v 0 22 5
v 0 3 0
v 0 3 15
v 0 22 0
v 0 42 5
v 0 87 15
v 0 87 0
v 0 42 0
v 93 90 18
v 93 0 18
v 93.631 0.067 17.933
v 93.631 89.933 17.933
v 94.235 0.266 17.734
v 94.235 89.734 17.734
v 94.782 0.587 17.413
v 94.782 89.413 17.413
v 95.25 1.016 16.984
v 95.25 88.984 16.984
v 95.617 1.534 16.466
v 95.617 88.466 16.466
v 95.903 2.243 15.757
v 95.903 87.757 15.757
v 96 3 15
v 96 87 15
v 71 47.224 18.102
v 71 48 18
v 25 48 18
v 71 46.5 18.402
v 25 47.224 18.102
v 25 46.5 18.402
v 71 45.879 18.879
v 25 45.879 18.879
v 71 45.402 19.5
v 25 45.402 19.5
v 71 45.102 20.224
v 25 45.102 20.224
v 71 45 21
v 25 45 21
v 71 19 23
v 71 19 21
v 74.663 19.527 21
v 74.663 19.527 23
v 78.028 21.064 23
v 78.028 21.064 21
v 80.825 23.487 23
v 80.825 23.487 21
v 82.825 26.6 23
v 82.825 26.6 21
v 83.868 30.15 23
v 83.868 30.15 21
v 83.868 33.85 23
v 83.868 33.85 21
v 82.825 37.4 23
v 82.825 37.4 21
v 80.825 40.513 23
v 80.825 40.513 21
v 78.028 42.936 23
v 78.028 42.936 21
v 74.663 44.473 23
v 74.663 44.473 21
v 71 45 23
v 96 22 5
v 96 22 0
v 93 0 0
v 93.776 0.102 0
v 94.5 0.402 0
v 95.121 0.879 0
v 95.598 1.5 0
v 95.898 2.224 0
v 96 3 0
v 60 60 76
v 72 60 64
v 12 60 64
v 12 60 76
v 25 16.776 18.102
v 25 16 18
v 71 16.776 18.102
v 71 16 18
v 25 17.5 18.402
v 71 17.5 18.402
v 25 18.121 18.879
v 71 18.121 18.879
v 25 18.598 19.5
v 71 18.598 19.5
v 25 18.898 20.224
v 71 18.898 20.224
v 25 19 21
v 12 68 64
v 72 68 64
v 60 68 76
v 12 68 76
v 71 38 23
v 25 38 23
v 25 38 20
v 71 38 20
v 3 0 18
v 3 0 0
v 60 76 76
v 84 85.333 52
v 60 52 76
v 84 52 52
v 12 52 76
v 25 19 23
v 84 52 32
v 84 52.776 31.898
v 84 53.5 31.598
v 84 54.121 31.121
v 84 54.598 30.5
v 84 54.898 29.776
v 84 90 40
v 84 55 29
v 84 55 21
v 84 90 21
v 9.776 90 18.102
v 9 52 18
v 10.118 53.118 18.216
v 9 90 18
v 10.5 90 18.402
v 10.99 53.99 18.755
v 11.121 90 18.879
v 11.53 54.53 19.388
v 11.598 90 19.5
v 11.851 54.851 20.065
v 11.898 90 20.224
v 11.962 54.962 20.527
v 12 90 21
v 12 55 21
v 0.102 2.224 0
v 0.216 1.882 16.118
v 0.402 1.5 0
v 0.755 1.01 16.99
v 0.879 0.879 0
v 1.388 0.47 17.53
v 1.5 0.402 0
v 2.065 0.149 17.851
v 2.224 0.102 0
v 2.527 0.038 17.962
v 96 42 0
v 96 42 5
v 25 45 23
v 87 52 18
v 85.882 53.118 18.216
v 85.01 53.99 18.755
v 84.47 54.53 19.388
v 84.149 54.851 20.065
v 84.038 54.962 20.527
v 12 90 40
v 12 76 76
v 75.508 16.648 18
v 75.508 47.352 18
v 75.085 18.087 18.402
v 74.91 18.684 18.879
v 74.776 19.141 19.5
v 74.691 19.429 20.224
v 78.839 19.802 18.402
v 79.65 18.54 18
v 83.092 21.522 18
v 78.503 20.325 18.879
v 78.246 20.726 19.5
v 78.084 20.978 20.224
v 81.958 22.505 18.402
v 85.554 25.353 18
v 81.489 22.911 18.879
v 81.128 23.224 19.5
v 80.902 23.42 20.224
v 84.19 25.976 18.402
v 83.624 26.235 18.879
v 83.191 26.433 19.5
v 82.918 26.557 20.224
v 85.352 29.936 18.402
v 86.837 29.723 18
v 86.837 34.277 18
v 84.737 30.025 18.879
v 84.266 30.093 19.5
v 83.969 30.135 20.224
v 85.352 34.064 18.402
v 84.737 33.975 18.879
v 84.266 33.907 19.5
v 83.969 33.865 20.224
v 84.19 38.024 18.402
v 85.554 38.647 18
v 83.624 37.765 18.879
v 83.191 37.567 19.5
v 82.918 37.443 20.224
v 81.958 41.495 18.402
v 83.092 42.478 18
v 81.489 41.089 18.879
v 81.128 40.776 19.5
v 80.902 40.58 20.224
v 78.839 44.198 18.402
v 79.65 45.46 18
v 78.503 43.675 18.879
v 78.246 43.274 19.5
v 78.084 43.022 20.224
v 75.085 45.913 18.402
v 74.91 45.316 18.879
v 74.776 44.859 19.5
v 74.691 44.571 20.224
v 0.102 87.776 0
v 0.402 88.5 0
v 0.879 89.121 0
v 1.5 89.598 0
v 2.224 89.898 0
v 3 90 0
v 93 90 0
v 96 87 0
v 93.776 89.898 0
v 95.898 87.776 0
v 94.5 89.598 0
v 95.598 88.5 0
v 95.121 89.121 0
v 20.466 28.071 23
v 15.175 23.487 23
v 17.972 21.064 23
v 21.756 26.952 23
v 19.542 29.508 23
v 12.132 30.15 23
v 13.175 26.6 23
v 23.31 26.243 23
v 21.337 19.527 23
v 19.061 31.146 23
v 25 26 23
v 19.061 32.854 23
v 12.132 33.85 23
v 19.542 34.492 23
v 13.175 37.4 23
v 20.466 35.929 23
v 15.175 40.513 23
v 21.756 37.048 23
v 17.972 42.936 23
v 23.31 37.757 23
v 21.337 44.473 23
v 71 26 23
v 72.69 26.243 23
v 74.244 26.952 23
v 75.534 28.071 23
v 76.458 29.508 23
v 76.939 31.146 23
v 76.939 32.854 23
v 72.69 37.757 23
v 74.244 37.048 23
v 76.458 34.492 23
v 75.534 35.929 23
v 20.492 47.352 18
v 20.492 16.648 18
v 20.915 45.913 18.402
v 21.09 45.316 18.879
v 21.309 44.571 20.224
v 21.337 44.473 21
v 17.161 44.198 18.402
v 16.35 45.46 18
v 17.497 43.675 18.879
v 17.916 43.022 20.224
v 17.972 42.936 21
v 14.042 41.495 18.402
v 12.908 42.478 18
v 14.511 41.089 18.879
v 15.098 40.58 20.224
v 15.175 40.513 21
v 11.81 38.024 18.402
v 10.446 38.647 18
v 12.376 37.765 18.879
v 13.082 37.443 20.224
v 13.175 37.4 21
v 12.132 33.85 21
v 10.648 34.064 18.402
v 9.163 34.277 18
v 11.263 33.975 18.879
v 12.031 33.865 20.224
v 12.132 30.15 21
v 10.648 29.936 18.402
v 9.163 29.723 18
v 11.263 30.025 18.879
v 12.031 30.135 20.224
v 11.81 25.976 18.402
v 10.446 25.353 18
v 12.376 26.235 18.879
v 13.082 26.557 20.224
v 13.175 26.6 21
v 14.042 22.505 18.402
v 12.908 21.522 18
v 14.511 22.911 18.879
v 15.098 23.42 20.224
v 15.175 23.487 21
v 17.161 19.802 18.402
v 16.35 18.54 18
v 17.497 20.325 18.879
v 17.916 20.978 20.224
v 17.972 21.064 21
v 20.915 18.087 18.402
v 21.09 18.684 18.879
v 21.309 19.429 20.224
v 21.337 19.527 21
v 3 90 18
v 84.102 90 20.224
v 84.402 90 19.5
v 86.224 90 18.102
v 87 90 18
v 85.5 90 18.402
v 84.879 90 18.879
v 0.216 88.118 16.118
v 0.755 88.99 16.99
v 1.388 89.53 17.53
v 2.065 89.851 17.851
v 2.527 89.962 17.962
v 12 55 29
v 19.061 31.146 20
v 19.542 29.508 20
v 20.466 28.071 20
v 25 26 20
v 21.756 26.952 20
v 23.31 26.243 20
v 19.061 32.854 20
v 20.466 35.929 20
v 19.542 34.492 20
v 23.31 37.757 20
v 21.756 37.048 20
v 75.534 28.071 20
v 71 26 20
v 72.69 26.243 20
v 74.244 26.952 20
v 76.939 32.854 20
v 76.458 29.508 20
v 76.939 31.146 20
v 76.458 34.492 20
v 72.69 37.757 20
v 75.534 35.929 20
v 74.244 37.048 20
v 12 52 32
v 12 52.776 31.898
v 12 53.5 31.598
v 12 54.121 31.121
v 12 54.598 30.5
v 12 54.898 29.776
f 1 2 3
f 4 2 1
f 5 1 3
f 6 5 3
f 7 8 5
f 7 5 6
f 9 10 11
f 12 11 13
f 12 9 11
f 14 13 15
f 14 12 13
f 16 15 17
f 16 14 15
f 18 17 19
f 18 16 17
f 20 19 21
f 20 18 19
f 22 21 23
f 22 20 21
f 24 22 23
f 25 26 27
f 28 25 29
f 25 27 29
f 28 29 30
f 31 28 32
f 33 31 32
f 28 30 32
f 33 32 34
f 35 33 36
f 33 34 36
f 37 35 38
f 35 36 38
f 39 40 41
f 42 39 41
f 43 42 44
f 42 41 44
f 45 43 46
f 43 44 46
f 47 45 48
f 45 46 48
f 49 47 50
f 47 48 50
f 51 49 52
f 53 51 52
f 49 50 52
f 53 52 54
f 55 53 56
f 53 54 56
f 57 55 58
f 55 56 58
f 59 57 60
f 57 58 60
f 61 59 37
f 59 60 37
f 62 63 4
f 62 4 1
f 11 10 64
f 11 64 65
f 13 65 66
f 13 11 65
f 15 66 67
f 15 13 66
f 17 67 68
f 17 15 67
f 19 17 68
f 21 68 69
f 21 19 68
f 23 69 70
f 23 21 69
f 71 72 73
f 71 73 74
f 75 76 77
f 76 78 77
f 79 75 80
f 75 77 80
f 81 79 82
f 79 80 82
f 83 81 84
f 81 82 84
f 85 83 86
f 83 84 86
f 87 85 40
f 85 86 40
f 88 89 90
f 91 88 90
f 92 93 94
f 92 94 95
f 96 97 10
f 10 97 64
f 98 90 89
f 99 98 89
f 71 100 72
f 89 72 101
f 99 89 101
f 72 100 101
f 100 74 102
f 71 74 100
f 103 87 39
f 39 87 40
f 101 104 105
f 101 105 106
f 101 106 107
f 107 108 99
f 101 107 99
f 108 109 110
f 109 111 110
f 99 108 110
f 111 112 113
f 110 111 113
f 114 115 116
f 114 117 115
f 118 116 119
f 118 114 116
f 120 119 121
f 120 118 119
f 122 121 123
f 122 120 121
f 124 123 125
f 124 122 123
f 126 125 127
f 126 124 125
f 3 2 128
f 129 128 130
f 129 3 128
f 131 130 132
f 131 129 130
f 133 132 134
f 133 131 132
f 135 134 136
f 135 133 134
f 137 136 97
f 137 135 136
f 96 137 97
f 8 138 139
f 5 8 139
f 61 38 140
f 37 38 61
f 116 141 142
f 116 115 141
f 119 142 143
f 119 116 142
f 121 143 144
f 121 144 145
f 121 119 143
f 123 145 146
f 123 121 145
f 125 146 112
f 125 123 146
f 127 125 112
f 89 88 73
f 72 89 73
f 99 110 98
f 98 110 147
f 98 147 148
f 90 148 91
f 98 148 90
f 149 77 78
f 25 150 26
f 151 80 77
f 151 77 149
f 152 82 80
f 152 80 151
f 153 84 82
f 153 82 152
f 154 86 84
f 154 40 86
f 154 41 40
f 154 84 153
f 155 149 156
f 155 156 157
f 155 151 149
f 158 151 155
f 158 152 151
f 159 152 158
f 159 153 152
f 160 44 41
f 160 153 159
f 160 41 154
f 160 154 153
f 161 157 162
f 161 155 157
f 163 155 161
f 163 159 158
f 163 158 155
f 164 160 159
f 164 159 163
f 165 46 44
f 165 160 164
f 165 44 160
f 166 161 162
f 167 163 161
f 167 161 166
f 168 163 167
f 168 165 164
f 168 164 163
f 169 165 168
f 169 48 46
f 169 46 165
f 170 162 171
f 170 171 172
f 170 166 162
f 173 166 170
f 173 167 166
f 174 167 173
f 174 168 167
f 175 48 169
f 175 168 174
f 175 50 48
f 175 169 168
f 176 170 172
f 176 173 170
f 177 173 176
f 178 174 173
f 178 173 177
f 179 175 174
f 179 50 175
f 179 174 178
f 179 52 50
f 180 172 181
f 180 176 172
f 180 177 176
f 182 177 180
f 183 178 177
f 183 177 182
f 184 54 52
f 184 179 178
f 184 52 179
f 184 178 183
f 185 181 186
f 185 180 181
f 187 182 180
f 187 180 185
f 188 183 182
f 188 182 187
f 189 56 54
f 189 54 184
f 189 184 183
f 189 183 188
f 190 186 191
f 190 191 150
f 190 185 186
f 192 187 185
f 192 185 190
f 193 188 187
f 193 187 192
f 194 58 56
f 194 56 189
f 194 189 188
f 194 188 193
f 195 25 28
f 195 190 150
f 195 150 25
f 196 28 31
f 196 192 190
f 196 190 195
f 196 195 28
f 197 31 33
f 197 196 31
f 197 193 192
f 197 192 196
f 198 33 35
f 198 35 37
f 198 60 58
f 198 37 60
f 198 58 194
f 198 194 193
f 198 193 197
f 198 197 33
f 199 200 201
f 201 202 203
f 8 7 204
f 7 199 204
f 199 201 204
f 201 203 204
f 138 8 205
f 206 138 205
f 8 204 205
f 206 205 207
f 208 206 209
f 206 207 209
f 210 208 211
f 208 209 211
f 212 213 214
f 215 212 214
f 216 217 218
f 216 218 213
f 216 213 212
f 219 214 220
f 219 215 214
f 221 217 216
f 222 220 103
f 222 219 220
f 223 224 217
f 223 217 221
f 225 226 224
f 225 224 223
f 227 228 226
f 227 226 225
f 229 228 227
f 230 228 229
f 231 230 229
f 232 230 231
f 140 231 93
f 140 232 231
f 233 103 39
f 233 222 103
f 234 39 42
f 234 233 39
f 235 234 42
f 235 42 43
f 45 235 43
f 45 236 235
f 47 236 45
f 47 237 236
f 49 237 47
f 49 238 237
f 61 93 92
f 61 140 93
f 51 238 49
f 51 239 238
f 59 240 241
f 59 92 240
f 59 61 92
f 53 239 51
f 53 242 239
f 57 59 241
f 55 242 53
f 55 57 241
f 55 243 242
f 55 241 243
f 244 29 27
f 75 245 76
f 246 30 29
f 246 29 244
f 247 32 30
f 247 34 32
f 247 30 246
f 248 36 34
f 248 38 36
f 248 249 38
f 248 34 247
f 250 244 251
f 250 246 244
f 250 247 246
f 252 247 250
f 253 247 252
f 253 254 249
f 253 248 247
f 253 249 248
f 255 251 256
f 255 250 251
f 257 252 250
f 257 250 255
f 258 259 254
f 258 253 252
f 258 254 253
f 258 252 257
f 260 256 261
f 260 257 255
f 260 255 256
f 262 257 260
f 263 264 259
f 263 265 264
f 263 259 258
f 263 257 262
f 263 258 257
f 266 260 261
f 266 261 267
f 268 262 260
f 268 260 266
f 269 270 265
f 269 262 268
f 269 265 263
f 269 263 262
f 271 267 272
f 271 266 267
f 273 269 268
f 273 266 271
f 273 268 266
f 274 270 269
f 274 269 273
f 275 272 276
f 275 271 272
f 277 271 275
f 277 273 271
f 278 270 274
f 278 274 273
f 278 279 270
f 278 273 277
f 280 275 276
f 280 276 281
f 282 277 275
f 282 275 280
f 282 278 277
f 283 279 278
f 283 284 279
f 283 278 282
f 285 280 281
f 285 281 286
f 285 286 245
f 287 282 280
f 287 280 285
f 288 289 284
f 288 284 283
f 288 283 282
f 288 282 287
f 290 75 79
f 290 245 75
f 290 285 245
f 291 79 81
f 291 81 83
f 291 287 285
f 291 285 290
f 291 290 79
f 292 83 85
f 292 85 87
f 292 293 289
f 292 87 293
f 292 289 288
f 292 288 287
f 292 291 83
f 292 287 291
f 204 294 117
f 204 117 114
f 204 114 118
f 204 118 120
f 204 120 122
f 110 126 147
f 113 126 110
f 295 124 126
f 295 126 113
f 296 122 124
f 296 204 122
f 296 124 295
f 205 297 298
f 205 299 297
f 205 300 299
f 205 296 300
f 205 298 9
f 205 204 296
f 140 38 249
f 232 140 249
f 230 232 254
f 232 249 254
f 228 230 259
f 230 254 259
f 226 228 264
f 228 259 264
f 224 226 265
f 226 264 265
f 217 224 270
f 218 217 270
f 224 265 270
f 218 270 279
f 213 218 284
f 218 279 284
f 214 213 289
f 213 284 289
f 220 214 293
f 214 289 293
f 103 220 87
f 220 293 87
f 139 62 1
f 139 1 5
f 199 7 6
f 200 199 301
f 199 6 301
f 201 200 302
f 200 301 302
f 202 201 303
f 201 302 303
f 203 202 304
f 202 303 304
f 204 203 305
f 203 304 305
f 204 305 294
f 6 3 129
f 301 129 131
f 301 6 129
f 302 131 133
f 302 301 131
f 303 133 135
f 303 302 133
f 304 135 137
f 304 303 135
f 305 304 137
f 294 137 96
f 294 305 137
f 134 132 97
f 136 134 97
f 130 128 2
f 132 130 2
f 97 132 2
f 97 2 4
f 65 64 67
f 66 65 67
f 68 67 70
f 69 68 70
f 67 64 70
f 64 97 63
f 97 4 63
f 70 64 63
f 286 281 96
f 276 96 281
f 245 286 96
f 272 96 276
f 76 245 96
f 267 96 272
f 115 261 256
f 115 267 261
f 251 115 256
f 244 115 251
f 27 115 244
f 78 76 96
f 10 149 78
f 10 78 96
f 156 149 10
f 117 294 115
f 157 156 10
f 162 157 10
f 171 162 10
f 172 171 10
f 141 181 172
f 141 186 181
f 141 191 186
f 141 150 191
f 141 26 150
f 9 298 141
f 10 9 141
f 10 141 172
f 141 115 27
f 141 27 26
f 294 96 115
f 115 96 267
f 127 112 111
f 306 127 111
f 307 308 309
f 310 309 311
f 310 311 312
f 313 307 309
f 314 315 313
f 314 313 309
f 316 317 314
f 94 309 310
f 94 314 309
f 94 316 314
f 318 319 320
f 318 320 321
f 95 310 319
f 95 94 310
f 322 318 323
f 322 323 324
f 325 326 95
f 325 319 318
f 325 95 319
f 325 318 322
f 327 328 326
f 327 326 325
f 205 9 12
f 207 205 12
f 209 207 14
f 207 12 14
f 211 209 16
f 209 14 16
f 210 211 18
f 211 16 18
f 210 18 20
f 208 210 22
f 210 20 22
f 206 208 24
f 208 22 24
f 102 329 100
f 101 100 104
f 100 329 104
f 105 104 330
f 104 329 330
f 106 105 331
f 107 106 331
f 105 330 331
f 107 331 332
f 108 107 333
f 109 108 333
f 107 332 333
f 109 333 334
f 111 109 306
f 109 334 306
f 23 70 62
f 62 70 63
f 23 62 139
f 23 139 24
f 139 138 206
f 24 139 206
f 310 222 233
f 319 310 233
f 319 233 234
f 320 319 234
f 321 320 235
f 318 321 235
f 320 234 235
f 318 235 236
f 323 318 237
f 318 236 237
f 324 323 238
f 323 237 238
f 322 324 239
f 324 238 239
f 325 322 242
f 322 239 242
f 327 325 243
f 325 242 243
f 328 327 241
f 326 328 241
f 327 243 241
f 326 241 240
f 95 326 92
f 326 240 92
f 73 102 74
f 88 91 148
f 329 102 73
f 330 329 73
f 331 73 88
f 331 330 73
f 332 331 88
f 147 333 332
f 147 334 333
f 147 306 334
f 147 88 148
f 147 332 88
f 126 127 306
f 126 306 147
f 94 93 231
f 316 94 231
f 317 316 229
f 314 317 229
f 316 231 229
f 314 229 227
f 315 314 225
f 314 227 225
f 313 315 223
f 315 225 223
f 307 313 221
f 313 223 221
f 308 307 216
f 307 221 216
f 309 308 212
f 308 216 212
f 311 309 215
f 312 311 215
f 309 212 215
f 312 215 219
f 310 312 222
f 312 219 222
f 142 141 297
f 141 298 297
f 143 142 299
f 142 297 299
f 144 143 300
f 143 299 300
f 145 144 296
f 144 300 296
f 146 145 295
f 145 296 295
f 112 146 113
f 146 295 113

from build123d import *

# Parameters (mm, degrees)
F0_W      = 96
F0_H      = 90
F1_DEPTH  = 18
F2_W      = 72
F2_H      = 38
F4_DEPTH  = 58
F6_DEPTH  = 38
F7_W      = 8
F7_H      = 12
F8_DEPTH  = 60.001
F10_DEPTH = 72.001
F11_W     = 20
F11_H     = 5
F12_DEPTH = 96
F13_W     = 46
F13_H     = 26
F14_DEPTH = 5
F15_W     = 46
F15_H     = 12
F17_DEPTH = 3
F18_W     = 3
F18_H     = 14
F19_DEPTH = 72
F20_R     = 2.99999


# Not quite as in the source:
# - a fillet or chamfer is up to 0.001 mm smaller than in the source, because OpenCascade refuses the exact size


with BuildPart() as f1:
    # F0 (on Top) → F1 (new body)
    with BuildSketch(Plane.XY):
        with Locations((48, 45)):
            Rectangle(F0_W, F0_H)
    extrude(amount=F1_DEPTH)

    # F2 (on face) → F4 (join, through all)
    with BuildSketch(Plane.XY.offset(18)):
        with Locations((48, 71)):
            Rectangle(F2_W, F2_H)
    extrude(amount=F4_DEPTH)

    # F5 (on face) → F6 (cut, through all)
    with BuildSketch(Plane.XZ.offset(-52)):
        Polygon((84, 52), (84, 76), (60, 76), align=None)
    extrude(amount=-F6_DEPTH, mode=Mode.SUBTRACT)

    # F7 (on face) → F8 (cut, through all)
    with BuildSketch(Plane(origin=(12, 0, 0), x_dir=(0, -1, 0), z_dir=(-1, 0, 0))):
        with Locations((-64, 70)):
            Rectangle(F7_W, F7_H)
    extrude(amount=-F8_DEPTH, mode=Mode.SUBTRACT)

    # F9 (on face) → F10 (cut, through all)
    with BuildSketch(Plane(origin=(12, 0, 0), x_dir=(0, -1, 0), z_dir=(-1, 0, 0))):
        Polygon((-90, 40), (-76, 76), (-90, 76), align=None)
    extrude(amount=-F10_DEPTH, mode=Mode.SUBTRACT)

    # F11 (on face) → F12 (cut, through all)
    with BuildSketch(Plane.YZ.offset(96)):
        with Locations((32, 2.5)):
            Rectangle(F11_W, F11_H)
    extrude(amount=-F12_DEPTH, mode=Mode.SUBTRACT)

    # F13 (on face) → F14 (join)
    with BuildSketch(Plane.XY.offset(18)):
        with Locations((48, 31.9999999999)):
            Rectangle(F13_W, F13_H)
        with BuildLine():
            Line((25, 18.9999999999), (25, 44.9999999999))
            ThreePointArc((25, 44.9999999999), (12, 31.9999999999), (25, 18.9999999999))
        make_face()
        with BuildLine():
            ThreePointArc((71, 18.9999999999), (84, 31.9999999999), (71, 44.9999999999))
            Line((71, 44.9999999999), (71, 18.9999999999))
        make_face()
    extrude(amount=F14_DEPTH)

    # F15 (on face) → F17 (cut, through all)
    with BuildSketch(Plane.XY.offset(23)):
        with Locations((48, 31.9999999999)):
            Rectangle(F15_W, F15_H)
        with BuildLine():
            Line((25, 25.9999999999), (25, 37.9999999999))
            ThreePointArc((25, 37.9999999999), (19, 31.9999999999), (25, 25.9999999999))
        make_face()
        with BuildLine():
            ThreePointArc((71, 25.9999999999), (77, 31.9999999999), (71, 37.9999999999))
            Line((71, 37.9999999999), (71, 25.9999999999))
        make_face()
    extrude(amount=-F17_DEPTH, mode=Mode.SUBTRACT)

    # F18 (on face) → F19 (cut, through all)
    with BuildSketch(Plane.YZ.offset(84)):
        with Locations((53.5, 25)):
            Rectangle(F18_W, F18_H)
    extrude(amount=-F19_DEPTH, mode=Mode.SUBTRACT)

    # F20 (radius 3 in the source; OpenCascade refuses exactly that, so slightly less here)
    f20_edges = [f1.edges().sort_by_distance(p)[0] for p in [
        (48, 19, 18),
        (48, 55, 18),
        (48, 55, 32),
        (84, 72.5, 18),
        (12, 72.5, 18),
        (0, 45, 18),
        (96, 45, 18),
        (96, 0, 9),
        (0, 0, 9),
        (0, 90, 9),
        (96, 90, 9),
    ]]
    fillet(f20_edges, radius=F20_R)


solid = f1.part
